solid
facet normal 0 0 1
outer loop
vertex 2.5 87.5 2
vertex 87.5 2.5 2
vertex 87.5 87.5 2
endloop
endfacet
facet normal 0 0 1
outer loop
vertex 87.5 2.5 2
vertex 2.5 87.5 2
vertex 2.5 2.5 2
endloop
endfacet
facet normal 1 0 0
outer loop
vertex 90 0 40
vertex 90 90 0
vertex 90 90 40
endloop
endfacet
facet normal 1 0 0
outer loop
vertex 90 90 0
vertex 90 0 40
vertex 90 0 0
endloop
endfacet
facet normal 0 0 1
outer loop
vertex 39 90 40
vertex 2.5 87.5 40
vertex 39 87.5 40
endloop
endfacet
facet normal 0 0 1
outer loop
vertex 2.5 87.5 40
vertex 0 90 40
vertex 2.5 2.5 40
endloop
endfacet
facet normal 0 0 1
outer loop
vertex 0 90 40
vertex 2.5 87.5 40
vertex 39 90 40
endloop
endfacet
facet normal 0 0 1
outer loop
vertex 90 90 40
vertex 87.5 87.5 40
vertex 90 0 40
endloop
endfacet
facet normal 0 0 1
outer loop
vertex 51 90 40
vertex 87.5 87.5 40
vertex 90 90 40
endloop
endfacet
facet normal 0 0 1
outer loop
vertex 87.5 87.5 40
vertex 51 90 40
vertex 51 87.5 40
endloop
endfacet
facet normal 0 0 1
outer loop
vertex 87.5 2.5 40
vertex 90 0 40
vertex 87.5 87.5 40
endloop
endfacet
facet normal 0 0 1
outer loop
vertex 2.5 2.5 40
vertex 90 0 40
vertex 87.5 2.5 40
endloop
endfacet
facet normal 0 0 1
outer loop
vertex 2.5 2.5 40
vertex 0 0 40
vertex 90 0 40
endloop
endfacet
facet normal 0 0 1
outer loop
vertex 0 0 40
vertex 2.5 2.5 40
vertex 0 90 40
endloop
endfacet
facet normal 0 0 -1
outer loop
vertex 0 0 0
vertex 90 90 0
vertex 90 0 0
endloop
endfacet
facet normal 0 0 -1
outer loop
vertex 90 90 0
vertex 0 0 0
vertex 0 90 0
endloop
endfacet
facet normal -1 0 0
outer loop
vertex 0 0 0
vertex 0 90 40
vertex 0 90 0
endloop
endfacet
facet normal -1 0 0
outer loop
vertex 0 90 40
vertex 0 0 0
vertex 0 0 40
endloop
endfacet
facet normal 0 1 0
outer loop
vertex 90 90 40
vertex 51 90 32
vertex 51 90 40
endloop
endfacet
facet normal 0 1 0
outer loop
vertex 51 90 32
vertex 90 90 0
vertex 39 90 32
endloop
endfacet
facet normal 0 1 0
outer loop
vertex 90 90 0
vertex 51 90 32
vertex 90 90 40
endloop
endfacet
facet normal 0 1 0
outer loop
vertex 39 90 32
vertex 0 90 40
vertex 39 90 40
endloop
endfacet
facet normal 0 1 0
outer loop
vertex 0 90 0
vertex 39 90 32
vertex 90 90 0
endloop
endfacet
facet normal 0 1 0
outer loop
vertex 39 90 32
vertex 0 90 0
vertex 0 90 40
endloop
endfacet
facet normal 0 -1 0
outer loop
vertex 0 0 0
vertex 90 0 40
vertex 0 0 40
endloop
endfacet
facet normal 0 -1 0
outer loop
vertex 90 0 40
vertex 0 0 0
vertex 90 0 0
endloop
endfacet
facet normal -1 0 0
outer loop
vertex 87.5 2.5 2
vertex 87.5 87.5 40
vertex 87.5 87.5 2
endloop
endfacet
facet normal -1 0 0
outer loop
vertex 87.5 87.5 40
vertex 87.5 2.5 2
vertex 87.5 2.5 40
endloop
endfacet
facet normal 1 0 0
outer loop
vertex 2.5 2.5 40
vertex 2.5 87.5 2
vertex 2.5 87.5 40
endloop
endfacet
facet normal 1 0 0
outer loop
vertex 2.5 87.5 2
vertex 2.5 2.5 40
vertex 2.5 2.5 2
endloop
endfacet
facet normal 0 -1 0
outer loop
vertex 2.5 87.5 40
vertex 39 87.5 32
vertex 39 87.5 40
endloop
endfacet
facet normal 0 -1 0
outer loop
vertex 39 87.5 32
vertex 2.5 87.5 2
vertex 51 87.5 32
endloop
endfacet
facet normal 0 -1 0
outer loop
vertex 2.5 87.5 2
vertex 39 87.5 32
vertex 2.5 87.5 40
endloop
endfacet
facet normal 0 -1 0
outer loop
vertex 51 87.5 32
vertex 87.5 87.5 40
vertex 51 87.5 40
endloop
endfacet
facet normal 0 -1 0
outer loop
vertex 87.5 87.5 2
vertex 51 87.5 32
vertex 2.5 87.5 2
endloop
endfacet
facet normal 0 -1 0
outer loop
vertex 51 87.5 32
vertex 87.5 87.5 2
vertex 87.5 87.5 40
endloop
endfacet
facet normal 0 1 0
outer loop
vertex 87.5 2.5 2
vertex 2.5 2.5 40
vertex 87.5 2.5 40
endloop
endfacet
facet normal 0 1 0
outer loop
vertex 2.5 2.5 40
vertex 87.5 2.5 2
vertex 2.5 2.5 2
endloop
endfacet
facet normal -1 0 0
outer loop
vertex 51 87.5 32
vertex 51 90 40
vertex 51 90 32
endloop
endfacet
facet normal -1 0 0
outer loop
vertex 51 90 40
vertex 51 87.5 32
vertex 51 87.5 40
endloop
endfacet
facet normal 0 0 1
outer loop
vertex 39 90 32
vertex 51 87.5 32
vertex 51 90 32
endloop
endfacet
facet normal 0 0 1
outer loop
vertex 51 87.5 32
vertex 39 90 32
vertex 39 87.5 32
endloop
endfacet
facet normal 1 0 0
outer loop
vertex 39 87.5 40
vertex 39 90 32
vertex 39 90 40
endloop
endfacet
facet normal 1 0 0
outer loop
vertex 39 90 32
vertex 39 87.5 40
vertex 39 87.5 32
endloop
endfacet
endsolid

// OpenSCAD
$fn = 64;

// Dimensions
OUTER_X = 90;
OUTER_Y = 90;
TOP_Z = 2;
WALL_THICK = 2.5;
WALL_H = 40;
PITCH = 71.5;
HOLE_R = 2.25;
NOTCH_W = 12;
NOTCH_H = 8;
NOTCH_Z_START = 32;

difference() {
    // Main solid block
    cube([OUTER_X, OUTER_Y, WALL_H]);

    // Inner hollow void (starts at top plate thickness)
    translate([WALL_THICK, WALL_THICK, TOP_Z])
        cube([OUTER_X - 2*WALL_THICK, OUTER_Y - 2*WALL_THICK, WALL_H - TOP_Z + 0.01]);

    // Screw holes (centred on plate at 45,45)
    for (x = [-PITCH/2, PITCH/2]) {
        for (y = [-PITCH/2, PITCH/2]) {
            translate([45 + x, 45 + y, 2])
                cylinder(r=HOLE_R, h=2.01);
        }
    }

    // Cable notch (in the Y=87.5..90 wall)
    translate([45 - NOTCH_W/2, OUTER_Y - WALL_THICK, NOTCH_Z_START])
        cube([NOTCH_W, WALL_THICK + 0.01, NOTCH_H + 0.01]);
}
